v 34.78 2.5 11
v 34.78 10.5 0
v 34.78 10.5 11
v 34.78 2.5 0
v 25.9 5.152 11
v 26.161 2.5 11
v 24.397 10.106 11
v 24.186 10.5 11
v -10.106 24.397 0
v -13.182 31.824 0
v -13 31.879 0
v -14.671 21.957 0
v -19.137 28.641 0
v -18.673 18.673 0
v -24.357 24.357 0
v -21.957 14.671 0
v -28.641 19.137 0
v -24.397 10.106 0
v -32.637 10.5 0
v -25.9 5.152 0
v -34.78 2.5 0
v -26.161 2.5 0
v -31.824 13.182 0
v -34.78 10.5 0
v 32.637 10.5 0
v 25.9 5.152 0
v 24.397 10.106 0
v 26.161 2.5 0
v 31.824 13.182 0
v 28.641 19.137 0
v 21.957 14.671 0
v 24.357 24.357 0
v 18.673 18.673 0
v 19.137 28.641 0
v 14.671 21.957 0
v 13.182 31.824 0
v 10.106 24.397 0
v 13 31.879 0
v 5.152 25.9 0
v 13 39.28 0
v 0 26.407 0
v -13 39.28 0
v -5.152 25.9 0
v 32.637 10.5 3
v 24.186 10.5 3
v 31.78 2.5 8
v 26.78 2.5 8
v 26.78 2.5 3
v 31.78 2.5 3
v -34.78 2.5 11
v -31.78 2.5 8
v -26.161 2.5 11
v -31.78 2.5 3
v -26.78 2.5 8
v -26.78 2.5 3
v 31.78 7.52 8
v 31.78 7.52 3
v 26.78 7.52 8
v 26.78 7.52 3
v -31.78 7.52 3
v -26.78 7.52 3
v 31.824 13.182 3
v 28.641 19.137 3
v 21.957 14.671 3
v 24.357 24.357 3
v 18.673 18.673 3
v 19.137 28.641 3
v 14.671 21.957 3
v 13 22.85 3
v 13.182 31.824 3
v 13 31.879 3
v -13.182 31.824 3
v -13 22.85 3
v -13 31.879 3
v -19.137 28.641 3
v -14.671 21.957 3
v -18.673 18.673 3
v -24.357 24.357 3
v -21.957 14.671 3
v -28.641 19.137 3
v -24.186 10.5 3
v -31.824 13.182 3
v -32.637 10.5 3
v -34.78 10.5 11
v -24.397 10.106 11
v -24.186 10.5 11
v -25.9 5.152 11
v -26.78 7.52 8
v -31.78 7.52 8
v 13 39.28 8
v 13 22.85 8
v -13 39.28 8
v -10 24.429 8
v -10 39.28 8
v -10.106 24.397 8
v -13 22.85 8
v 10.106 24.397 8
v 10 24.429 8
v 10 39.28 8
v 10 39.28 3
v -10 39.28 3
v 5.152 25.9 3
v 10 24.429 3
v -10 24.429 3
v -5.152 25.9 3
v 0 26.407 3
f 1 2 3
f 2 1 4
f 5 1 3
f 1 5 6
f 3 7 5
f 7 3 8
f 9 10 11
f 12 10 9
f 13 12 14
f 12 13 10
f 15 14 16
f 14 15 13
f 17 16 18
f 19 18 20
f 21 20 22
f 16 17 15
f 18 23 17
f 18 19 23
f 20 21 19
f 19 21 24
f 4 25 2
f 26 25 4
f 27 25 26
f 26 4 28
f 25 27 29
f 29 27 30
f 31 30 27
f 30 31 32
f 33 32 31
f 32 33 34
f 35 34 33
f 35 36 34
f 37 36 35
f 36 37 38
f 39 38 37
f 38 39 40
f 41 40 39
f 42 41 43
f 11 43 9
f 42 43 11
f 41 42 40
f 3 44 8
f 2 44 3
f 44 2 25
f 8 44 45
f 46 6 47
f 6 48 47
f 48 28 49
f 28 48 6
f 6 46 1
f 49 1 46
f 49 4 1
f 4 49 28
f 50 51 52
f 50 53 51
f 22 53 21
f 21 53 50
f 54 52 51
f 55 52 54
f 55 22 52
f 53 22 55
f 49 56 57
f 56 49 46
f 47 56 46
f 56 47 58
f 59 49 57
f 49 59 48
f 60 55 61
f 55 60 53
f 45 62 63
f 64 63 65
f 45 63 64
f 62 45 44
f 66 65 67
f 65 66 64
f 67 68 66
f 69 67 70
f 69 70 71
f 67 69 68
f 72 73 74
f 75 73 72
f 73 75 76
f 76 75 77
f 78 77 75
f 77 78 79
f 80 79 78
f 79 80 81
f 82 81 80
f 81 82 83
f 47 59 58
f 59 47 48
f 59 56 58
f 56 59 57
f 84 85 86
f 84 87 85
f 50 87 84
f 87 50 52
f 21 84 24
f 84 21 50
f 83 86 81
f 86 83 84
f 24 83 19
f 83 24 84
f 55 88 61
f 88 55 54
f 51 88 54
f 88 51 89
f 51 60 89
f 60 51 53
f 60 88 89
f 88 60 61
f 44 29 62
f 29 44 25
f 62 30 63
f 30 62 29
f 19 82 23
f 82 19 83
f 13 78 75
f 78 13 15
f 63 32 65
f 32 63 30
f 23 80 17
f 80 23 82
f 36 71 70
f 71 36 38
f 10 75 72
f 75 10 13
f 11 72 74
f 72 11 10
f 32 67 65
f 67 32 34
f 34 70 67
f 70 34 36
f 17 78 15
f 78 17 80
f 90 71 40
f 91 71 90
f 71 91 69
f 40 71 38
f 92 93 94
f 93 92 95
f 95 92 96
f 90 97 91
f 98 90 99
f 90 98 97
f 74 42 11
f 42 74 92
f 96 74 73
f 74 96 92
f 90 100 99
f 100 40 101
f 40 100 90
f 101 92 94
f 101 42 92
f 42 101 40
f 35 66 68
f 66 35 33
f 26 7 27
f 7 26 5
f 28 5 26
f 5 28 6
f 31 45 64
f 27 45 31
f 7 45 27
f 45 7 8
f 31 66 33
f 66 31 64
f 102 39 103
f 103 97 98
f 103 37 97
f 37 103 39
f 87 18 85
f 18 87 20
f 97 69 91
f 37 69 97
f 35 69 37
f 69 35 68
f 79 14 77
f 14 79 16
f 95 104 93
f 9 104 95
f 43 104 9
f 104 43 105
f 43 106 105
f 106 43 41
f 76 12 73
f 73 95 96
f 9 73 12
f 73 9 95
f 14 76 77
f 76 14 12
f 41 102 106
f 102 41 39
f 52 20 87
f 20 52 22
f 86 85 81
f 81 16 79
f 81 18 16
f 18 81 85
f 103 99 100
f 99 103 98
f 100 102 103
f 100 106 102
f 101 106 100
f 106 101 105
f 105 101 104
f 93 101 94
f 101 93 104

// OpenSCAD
// file: vars.scad
// Variables used throughout design.
// Yes, these could use some commenting.
// (c) 2014, Christopher "ScribbleJ" Jansen

// Printer outside dimensions are actually this + corner_thick*2.
printer_w = 400;
printer_l = 400;
printer_h = 400;

// Used wherever I need something arbitrarily large.
huge=500;

// 608 Bearings
bearing_w = 7;
bearing_d = 22;
bearing_r = bearing_d/2;
bearing_hole_d = 8;
bearing_hole_r = bearing_hole_d/2;

// Miscellaneous bolts, M3
misc_bolt_d = 3.2;
misc_bolt_r = misc_bolt_d/2;
misc_nut_r  = misc_bolt_d;
misc_bolt_pitch = 0.5;
misc_bolthead_d = misc_bolt_d*2;
misc_bolthead_r = misc_bolthead_d/2;

// Bearing retainers
retainer_shell_thick = 0.5;
retainer_shell_sep   = 0.25;
retainer_lip_thick   = 2;
retainer_inner_width = 1;

// GT2, 2mm belting
belt_w    = 6;
belt_thick= 2;
belt_sep  = retainer_lip_thick*2 + 2;

// Some calculated info about the bearing retainers.
calc_retainer_h  = retainer_lip_thick*2 + belt_w;
calc_retainer_ir = bearing_r + retainer_shell_thick*2 + retainer_shell_sep;
calc_retainer_or = calc_retainer_ir + belt_thick;
calc_retainer_b_off = retainer_lip_thick - (bearing_w-belt_w)/2;

// 20mm Tslot and associated bolt dimensions
tslot_w = 20;
tslot_bolt_d = 5;
tslot_bolt_r = tslot_bolt_d/2;
tslot_bolt_l = 4;
tslot_bolthead_d = 10;
tslot_bolthead_r = tslot_bolthead_d/2;

// This variable is called corner_thick, but it's used pretty much everywhere something needs to be sturdy but thin, not
// just on the corners.
// TODO: Anywhere it's used that's not a corner, I should make a new variable for that thing.
corner_thick = 5;
corner_length = tslot_w*3;

// 8mm Smooth Rod dimensions
rod_d=8;
rod_r=rod_d/2;

// Named because they were originally bronze bushings, now expects to be LM8UU.
bushing_d=15;
bushing_r=bushing_d/2;
bushing_l=10;
bushing_flange_r = bushing_r+3;
bushing_flange_w = 1;
bushing_material_thick = 5;

// X Axis dimensions
x_rod_sep = 50;
x_carriage_l = 50;
x_mount_sep_x = x_carriage_l - misc_bolthead_r*2*2 - misc_bolt_r*2;
x_mount_offset = bushing_r + misc_bolt_r * 2;
belt_above_x = bushing_r+misc_nut_r*2;
belt_clamp_w = 7;
x_rod_past_bearing = 20;

// Y Axis dimensions
belt_above_y = 45;
y_above_x = belt_above_x-belt_above_y;


// The standoffs for the belt idler bearings.
bearing_mount_base = corner_thick;
bearing_mount_extra = 2;
belt_above_bearing_mount = bearing_mount_base + bearing_mount_extra + retainer_lip_thick;
bearing_mount_support_tweak = 30;
y_bearing_offset = bushing_r+bushing_material_thick-calc_retainer_ir;
y_bearing_sep_y = calc_retainer_ir*2+belt_thick;
y_bearing_sep_z = belt_w+belt_sep;
bearing_bolt_r  = 4;
bearing_bolt_pitch = 1.25;
bearing_bolt_holder_thick = 4;

// Gap between Y carriage and T-slot
y_carriage_from_tslot = 2;

// 50mm Y-carriage length fits 2 LM8UU
y_carriage_len = 50;

// NEMA17 Motor Dimensions
motor_w = 42.3;
motor_h = motor_w;
motor_bolt_sep = 31.0;
motor_bolt_r   = 1.5;
// Dimensions of pulleys on X/Y Motors
motor_pulley_d = 10;
motor_pulley_r = motor_pulley_d/2;
motor_pulley_h = 5.3;  // This is the distance the pulley is above the motor body, not the height of the pulley itself.
motor_flange_d = 23;
motor_flange_r = motor_flange_d/2;
// This creates an extra hole in the motor corner for T-slot mounting, because the spaces for the motor mounts may coincide 
// with one of the standard holes.
motor_corner_extra_hole_pos = tslot_bolt_r+3;

// Some useful precalculated values
calc_corner_from_y_rod = x_rod_past_bearing+corner_thick+y_carriage_from_tslot+tslot_w;
calc_corner_above_x = belt_above_x - belt_above_bearing_mount + bearing_mount_base;
calc_motor1_above_x  = belt_above_x - motor_pulley_h;
calc_motor2_above_x  = belt_above_x - motor_pulley_h + belt_w + belt_sep;
calc_motor_from_y_rod = -bushing_r - bushing_material_thick + bearing_bolt_holder_thick + bearing_bolt_r + calc_retainer_or + motor_pulley_r;

// Motor bracket thick is 12 because I'm using M3x16 to mount the motors and the bolts can fit about 4mm into a NEMA17.
motor_bracket_thick = 12;
motor_bracket_wide = (motor_w - motor_flange_d) / 2;
motor_bracket_len  = motor_w;
motor_bolt_offset  = (motor_w - motor_bolt_sep) / 2;

// How far apart the Z smooth rods should be
z_rod_sep = 150;
z_motor_off = motor_h - tslot_w - corner_thick;

// Very important to set this for your lasercut Z, the thickness of the material you are lasering.
laser_mat_thick = 4.75;
// Laser mat margin is how much material is required outside of a tabslot.
laser_mat_margin = laser_mat_thick;
// Distance between heated bed holes, 209 is standard for a reprap heated bed
bed_mount_sep   = 209;
// Bed mounting holes will be created centered on the Z platform, and another set offset at this distance from the smooth rod:
bed_from_z      = 60;
// bed_box_r and bed_box_h here will exactly fir the lm8uu holders.  Decrease at your own peril.
bed_box_r       = 25;
bed_box_h       = 50;
z_ends_sep = printer_l - tslot_w*2 - corner_thick*2 - motor_w;
platform_l      =  laser_mat_margin*2 + laser_mat_thick*2 + bed_box_r*2 + z_ends_sep;
platform_w      = bed_mount_sep + misc_bolt_r*2 + laser_mat_margin*2;
// These settings for the leadscrew fit the leadscrews sold by MakersToolWorks
z_leadscrew_passthrough_r = 12/2;
leadscrew_bolt_offset = 22/2;
leadscrew_bolt_r = 3.2/2;
laser_bushing_fudge = 0.1; // No longer used since the change to lm8uu


// LM8UU bearing dimensions
lm8uu_d=15;
lm8uu_r=lm8uu_d/2;
lm8uu_l=24;
// The nut and bolt here refer to the ones used in the Z axis' four LM8UU holders.
lm8uu_bolt_r=5/2;
lm8uu_nut_r=10/2;

arduino_width=60;
// file: common.scad
// Common functions used in various places throughout.
// (c) 2014, Christopher "ScribbleJ" Jansen
include <vars.scad>

// Reduce radius of holes intended to hold bolts by threads.
// 0.86603 * p = nominal depth of threads.  1/3-1/2 of that is about right.
function smallhole(r,p) = r - ((p*0.86603)/3);

// Polyhole derived from Nophead's Polyhole work: http://hydraraptor.blogspot.com/2011/02/polyholes.html
module polyhole(r,h,v=6,a=0)
{
  rotate([0,0,a]) cylinder( h = h, r = r  / cos( 180 / v ), $fn = v );
}
// 2D version of Polyhole
module polycircle(r,v=6,a=0)
{
  rotate([0,0,a]) circle(r = r  / cos( 180 / v ), $fn = v );
}
// Cutout for bolthole
module bolt(bolt_r = misc_bolt_r,bolthead_r = misc_bolthead_r,bolt_len = huge,v=6,a=0)
{
  translate([0,0,-bolt_len]) polyhole(r=bolt_r,h=bolt_len+1,v=v,a=a);
  polyhole(r=bolthead_r,h=huge,v=v,a=a);
}
// 2D ring
module ring(inner=5,outer=10,v=32)
{
  difference()
  {
    circle(r=outer);
    polycircle(r=inner,v=v);
  }
} 
// 2D Rounded square
module roundsquare(dim=[50,50],r=5)
{
  translate([0,r]) square([dim[0], dim[1] - r*2]);
  translate([r,0]) square([dim[0] - r*2, dim[1]]);
  for(x=[r,dim[0]-r])
  for(y=[r,dim[1]-r])
    translate([x,y]) circle(r=r);
}
// Lasercutting Tabs
module maketabs(l=100,w=5,num=10)
{
  tablength=l/(num * 2);
  for(x=[tablength/2:tablength*2:l])
    translate([x,0]) square([tablength,w]);
}
// Support for printing bearing mount
module support(l=bearing_mount_base+bearing_mount_extra+y_bearing_sep_z+calc_retainer_b_off,w=bearing_hole_d * tan(180/6) *2,extra=0,extra_l=0)
{
  translate([-w/2,0,-l]) 
  {
    difference()
    {
      rotate([45,0,0]) cube([w,huge/2,huge/2]);
      translate([-huge/2,0,0]) cube([huge,huge,huge]);
      translate([-huge/2,-huge/2,l]) cube([huge,huge,huge]);
    }
    translate([0,-extra,-extra_l/2]) cube([w,extra,extra_l]);
  }

}
// main file
// 'Standardextruder' addon for fan and probe
// Optional.  Print 1 fan_holder and 1 probe_holder..
// (c) 2014, Christopher "ScribbleJ" Jansen
include <common.scad>

fan_bolt_sep = 33;
fan_bolt_r = 23.33;
fan_holder_thick = misc_nut_r*2-0.5;
fan_holder_h = 3;

holder_from_bolt = 5;

magnet_holder_thick = 3;
magnet_w = 5;

probe_length=5;
probe_w=20;
probe_h=5;

// Illustrative fan
%translate([0,0,-10]) difference() { translate([-20,-20,0]) cube([40,40,10]); translate([0,0,-1]) cylinder(r=39/2,h=huge); }
%fan_holder();
probe_holder();

module probe_holder()
{
  difference()
  {
    union()
    {
      polyhole(r=fan_bolt_r+fan_holder_thick/2+magnet_w+magnet_holder_thick, h=fan_holder_h,v=32);
       for(x=[fan_bolt_r+fan_holder_thick/2+magnet_w/2+0.5,-1*(fan_bolt_r+fan_holder_thick/2+magnet_w/2+0.5)])
        translate([x,magnet_w,0]) magnet_holder(3);
      // Probe holder
      translate([-probe_w/2-fan_holder_h,0,0]) cube([probe_w+fan_holder_h*2,fan_bolt_r+fan_holder_thick/2+magnet_w+magnet_holder_thick+probe_length,fan_holder_h+probe_h]);
    }
    translate([0,0,-1]) polyhole(r=fan_bolt_r+fan_holder_thick/2,h=huge,v=32);
    translate([-huge/2,magnet_w/2-huge,-1]) cube([huge,huge,huge]);
    // Probe holder
    translate([-probe_w/2,0,fan_holder_h]) cube([probe_w,huge,fan_holder_h+probe_h]);

  }
    
}

module fan_holder()
{
  // Fan part
  difference()
  {
    polyhole(r=fan_bolt_r+fan_holder_thick/2,h=fan_holder_h,v=32);
    // big center hole
    translate([0,0,-1]) polyhole(r=fan_bolt_r-fan_holder_thick/2,h=huge,v=32);
    // fan mount bolt holes
    for(a=[45:90:360]) 
      rotate([0,0,a]) translate([fan_bolt_r,0,3]) bolt(a=360/12);
    // Cut off bottom
    translate([-huge/2,-huge-20,-1]) cube([huge,huge,huge]);
  }

  // Attachment bolt
  translate([0,20,fan_holder_h])
  rotate([90,0,180]) 
  difference()
  {
    cylinder(r=misc_nut_r+5,h=fan_holder_h,$fn=32);
    translate([-huge/2,-huge-3,-1]) cube([huge,huge,huge]);
    translate([0,5,-1]) polyhole(r=misc_bolt_r,h=huge);
  }

  // Magnets
  for(x=[fan_bolt_r+fan_holder_thick/2+magnet_w/2+0.5,-1*(fan_bolt_r+fan_holder_thick/2+magnet_w/2+0.5)])
    translate([x,0,0]) magnet_holder();
}

module magnet_holder(cap=0)
{
  translate([-magnet_w/2-magnet_holder_thick,-magnet_w/2,0])
  difference()
  {
    cube([magnet_w+magnet_holder_thick*2,magnet_w+cap,magnet_w+magnet_holder_thick*2]);
    translate([magnet_holder_thick,-1,magnet_holder_thick]) cube([magnet_w,magnet_w+1.02,magnet_w]);
  }
}
